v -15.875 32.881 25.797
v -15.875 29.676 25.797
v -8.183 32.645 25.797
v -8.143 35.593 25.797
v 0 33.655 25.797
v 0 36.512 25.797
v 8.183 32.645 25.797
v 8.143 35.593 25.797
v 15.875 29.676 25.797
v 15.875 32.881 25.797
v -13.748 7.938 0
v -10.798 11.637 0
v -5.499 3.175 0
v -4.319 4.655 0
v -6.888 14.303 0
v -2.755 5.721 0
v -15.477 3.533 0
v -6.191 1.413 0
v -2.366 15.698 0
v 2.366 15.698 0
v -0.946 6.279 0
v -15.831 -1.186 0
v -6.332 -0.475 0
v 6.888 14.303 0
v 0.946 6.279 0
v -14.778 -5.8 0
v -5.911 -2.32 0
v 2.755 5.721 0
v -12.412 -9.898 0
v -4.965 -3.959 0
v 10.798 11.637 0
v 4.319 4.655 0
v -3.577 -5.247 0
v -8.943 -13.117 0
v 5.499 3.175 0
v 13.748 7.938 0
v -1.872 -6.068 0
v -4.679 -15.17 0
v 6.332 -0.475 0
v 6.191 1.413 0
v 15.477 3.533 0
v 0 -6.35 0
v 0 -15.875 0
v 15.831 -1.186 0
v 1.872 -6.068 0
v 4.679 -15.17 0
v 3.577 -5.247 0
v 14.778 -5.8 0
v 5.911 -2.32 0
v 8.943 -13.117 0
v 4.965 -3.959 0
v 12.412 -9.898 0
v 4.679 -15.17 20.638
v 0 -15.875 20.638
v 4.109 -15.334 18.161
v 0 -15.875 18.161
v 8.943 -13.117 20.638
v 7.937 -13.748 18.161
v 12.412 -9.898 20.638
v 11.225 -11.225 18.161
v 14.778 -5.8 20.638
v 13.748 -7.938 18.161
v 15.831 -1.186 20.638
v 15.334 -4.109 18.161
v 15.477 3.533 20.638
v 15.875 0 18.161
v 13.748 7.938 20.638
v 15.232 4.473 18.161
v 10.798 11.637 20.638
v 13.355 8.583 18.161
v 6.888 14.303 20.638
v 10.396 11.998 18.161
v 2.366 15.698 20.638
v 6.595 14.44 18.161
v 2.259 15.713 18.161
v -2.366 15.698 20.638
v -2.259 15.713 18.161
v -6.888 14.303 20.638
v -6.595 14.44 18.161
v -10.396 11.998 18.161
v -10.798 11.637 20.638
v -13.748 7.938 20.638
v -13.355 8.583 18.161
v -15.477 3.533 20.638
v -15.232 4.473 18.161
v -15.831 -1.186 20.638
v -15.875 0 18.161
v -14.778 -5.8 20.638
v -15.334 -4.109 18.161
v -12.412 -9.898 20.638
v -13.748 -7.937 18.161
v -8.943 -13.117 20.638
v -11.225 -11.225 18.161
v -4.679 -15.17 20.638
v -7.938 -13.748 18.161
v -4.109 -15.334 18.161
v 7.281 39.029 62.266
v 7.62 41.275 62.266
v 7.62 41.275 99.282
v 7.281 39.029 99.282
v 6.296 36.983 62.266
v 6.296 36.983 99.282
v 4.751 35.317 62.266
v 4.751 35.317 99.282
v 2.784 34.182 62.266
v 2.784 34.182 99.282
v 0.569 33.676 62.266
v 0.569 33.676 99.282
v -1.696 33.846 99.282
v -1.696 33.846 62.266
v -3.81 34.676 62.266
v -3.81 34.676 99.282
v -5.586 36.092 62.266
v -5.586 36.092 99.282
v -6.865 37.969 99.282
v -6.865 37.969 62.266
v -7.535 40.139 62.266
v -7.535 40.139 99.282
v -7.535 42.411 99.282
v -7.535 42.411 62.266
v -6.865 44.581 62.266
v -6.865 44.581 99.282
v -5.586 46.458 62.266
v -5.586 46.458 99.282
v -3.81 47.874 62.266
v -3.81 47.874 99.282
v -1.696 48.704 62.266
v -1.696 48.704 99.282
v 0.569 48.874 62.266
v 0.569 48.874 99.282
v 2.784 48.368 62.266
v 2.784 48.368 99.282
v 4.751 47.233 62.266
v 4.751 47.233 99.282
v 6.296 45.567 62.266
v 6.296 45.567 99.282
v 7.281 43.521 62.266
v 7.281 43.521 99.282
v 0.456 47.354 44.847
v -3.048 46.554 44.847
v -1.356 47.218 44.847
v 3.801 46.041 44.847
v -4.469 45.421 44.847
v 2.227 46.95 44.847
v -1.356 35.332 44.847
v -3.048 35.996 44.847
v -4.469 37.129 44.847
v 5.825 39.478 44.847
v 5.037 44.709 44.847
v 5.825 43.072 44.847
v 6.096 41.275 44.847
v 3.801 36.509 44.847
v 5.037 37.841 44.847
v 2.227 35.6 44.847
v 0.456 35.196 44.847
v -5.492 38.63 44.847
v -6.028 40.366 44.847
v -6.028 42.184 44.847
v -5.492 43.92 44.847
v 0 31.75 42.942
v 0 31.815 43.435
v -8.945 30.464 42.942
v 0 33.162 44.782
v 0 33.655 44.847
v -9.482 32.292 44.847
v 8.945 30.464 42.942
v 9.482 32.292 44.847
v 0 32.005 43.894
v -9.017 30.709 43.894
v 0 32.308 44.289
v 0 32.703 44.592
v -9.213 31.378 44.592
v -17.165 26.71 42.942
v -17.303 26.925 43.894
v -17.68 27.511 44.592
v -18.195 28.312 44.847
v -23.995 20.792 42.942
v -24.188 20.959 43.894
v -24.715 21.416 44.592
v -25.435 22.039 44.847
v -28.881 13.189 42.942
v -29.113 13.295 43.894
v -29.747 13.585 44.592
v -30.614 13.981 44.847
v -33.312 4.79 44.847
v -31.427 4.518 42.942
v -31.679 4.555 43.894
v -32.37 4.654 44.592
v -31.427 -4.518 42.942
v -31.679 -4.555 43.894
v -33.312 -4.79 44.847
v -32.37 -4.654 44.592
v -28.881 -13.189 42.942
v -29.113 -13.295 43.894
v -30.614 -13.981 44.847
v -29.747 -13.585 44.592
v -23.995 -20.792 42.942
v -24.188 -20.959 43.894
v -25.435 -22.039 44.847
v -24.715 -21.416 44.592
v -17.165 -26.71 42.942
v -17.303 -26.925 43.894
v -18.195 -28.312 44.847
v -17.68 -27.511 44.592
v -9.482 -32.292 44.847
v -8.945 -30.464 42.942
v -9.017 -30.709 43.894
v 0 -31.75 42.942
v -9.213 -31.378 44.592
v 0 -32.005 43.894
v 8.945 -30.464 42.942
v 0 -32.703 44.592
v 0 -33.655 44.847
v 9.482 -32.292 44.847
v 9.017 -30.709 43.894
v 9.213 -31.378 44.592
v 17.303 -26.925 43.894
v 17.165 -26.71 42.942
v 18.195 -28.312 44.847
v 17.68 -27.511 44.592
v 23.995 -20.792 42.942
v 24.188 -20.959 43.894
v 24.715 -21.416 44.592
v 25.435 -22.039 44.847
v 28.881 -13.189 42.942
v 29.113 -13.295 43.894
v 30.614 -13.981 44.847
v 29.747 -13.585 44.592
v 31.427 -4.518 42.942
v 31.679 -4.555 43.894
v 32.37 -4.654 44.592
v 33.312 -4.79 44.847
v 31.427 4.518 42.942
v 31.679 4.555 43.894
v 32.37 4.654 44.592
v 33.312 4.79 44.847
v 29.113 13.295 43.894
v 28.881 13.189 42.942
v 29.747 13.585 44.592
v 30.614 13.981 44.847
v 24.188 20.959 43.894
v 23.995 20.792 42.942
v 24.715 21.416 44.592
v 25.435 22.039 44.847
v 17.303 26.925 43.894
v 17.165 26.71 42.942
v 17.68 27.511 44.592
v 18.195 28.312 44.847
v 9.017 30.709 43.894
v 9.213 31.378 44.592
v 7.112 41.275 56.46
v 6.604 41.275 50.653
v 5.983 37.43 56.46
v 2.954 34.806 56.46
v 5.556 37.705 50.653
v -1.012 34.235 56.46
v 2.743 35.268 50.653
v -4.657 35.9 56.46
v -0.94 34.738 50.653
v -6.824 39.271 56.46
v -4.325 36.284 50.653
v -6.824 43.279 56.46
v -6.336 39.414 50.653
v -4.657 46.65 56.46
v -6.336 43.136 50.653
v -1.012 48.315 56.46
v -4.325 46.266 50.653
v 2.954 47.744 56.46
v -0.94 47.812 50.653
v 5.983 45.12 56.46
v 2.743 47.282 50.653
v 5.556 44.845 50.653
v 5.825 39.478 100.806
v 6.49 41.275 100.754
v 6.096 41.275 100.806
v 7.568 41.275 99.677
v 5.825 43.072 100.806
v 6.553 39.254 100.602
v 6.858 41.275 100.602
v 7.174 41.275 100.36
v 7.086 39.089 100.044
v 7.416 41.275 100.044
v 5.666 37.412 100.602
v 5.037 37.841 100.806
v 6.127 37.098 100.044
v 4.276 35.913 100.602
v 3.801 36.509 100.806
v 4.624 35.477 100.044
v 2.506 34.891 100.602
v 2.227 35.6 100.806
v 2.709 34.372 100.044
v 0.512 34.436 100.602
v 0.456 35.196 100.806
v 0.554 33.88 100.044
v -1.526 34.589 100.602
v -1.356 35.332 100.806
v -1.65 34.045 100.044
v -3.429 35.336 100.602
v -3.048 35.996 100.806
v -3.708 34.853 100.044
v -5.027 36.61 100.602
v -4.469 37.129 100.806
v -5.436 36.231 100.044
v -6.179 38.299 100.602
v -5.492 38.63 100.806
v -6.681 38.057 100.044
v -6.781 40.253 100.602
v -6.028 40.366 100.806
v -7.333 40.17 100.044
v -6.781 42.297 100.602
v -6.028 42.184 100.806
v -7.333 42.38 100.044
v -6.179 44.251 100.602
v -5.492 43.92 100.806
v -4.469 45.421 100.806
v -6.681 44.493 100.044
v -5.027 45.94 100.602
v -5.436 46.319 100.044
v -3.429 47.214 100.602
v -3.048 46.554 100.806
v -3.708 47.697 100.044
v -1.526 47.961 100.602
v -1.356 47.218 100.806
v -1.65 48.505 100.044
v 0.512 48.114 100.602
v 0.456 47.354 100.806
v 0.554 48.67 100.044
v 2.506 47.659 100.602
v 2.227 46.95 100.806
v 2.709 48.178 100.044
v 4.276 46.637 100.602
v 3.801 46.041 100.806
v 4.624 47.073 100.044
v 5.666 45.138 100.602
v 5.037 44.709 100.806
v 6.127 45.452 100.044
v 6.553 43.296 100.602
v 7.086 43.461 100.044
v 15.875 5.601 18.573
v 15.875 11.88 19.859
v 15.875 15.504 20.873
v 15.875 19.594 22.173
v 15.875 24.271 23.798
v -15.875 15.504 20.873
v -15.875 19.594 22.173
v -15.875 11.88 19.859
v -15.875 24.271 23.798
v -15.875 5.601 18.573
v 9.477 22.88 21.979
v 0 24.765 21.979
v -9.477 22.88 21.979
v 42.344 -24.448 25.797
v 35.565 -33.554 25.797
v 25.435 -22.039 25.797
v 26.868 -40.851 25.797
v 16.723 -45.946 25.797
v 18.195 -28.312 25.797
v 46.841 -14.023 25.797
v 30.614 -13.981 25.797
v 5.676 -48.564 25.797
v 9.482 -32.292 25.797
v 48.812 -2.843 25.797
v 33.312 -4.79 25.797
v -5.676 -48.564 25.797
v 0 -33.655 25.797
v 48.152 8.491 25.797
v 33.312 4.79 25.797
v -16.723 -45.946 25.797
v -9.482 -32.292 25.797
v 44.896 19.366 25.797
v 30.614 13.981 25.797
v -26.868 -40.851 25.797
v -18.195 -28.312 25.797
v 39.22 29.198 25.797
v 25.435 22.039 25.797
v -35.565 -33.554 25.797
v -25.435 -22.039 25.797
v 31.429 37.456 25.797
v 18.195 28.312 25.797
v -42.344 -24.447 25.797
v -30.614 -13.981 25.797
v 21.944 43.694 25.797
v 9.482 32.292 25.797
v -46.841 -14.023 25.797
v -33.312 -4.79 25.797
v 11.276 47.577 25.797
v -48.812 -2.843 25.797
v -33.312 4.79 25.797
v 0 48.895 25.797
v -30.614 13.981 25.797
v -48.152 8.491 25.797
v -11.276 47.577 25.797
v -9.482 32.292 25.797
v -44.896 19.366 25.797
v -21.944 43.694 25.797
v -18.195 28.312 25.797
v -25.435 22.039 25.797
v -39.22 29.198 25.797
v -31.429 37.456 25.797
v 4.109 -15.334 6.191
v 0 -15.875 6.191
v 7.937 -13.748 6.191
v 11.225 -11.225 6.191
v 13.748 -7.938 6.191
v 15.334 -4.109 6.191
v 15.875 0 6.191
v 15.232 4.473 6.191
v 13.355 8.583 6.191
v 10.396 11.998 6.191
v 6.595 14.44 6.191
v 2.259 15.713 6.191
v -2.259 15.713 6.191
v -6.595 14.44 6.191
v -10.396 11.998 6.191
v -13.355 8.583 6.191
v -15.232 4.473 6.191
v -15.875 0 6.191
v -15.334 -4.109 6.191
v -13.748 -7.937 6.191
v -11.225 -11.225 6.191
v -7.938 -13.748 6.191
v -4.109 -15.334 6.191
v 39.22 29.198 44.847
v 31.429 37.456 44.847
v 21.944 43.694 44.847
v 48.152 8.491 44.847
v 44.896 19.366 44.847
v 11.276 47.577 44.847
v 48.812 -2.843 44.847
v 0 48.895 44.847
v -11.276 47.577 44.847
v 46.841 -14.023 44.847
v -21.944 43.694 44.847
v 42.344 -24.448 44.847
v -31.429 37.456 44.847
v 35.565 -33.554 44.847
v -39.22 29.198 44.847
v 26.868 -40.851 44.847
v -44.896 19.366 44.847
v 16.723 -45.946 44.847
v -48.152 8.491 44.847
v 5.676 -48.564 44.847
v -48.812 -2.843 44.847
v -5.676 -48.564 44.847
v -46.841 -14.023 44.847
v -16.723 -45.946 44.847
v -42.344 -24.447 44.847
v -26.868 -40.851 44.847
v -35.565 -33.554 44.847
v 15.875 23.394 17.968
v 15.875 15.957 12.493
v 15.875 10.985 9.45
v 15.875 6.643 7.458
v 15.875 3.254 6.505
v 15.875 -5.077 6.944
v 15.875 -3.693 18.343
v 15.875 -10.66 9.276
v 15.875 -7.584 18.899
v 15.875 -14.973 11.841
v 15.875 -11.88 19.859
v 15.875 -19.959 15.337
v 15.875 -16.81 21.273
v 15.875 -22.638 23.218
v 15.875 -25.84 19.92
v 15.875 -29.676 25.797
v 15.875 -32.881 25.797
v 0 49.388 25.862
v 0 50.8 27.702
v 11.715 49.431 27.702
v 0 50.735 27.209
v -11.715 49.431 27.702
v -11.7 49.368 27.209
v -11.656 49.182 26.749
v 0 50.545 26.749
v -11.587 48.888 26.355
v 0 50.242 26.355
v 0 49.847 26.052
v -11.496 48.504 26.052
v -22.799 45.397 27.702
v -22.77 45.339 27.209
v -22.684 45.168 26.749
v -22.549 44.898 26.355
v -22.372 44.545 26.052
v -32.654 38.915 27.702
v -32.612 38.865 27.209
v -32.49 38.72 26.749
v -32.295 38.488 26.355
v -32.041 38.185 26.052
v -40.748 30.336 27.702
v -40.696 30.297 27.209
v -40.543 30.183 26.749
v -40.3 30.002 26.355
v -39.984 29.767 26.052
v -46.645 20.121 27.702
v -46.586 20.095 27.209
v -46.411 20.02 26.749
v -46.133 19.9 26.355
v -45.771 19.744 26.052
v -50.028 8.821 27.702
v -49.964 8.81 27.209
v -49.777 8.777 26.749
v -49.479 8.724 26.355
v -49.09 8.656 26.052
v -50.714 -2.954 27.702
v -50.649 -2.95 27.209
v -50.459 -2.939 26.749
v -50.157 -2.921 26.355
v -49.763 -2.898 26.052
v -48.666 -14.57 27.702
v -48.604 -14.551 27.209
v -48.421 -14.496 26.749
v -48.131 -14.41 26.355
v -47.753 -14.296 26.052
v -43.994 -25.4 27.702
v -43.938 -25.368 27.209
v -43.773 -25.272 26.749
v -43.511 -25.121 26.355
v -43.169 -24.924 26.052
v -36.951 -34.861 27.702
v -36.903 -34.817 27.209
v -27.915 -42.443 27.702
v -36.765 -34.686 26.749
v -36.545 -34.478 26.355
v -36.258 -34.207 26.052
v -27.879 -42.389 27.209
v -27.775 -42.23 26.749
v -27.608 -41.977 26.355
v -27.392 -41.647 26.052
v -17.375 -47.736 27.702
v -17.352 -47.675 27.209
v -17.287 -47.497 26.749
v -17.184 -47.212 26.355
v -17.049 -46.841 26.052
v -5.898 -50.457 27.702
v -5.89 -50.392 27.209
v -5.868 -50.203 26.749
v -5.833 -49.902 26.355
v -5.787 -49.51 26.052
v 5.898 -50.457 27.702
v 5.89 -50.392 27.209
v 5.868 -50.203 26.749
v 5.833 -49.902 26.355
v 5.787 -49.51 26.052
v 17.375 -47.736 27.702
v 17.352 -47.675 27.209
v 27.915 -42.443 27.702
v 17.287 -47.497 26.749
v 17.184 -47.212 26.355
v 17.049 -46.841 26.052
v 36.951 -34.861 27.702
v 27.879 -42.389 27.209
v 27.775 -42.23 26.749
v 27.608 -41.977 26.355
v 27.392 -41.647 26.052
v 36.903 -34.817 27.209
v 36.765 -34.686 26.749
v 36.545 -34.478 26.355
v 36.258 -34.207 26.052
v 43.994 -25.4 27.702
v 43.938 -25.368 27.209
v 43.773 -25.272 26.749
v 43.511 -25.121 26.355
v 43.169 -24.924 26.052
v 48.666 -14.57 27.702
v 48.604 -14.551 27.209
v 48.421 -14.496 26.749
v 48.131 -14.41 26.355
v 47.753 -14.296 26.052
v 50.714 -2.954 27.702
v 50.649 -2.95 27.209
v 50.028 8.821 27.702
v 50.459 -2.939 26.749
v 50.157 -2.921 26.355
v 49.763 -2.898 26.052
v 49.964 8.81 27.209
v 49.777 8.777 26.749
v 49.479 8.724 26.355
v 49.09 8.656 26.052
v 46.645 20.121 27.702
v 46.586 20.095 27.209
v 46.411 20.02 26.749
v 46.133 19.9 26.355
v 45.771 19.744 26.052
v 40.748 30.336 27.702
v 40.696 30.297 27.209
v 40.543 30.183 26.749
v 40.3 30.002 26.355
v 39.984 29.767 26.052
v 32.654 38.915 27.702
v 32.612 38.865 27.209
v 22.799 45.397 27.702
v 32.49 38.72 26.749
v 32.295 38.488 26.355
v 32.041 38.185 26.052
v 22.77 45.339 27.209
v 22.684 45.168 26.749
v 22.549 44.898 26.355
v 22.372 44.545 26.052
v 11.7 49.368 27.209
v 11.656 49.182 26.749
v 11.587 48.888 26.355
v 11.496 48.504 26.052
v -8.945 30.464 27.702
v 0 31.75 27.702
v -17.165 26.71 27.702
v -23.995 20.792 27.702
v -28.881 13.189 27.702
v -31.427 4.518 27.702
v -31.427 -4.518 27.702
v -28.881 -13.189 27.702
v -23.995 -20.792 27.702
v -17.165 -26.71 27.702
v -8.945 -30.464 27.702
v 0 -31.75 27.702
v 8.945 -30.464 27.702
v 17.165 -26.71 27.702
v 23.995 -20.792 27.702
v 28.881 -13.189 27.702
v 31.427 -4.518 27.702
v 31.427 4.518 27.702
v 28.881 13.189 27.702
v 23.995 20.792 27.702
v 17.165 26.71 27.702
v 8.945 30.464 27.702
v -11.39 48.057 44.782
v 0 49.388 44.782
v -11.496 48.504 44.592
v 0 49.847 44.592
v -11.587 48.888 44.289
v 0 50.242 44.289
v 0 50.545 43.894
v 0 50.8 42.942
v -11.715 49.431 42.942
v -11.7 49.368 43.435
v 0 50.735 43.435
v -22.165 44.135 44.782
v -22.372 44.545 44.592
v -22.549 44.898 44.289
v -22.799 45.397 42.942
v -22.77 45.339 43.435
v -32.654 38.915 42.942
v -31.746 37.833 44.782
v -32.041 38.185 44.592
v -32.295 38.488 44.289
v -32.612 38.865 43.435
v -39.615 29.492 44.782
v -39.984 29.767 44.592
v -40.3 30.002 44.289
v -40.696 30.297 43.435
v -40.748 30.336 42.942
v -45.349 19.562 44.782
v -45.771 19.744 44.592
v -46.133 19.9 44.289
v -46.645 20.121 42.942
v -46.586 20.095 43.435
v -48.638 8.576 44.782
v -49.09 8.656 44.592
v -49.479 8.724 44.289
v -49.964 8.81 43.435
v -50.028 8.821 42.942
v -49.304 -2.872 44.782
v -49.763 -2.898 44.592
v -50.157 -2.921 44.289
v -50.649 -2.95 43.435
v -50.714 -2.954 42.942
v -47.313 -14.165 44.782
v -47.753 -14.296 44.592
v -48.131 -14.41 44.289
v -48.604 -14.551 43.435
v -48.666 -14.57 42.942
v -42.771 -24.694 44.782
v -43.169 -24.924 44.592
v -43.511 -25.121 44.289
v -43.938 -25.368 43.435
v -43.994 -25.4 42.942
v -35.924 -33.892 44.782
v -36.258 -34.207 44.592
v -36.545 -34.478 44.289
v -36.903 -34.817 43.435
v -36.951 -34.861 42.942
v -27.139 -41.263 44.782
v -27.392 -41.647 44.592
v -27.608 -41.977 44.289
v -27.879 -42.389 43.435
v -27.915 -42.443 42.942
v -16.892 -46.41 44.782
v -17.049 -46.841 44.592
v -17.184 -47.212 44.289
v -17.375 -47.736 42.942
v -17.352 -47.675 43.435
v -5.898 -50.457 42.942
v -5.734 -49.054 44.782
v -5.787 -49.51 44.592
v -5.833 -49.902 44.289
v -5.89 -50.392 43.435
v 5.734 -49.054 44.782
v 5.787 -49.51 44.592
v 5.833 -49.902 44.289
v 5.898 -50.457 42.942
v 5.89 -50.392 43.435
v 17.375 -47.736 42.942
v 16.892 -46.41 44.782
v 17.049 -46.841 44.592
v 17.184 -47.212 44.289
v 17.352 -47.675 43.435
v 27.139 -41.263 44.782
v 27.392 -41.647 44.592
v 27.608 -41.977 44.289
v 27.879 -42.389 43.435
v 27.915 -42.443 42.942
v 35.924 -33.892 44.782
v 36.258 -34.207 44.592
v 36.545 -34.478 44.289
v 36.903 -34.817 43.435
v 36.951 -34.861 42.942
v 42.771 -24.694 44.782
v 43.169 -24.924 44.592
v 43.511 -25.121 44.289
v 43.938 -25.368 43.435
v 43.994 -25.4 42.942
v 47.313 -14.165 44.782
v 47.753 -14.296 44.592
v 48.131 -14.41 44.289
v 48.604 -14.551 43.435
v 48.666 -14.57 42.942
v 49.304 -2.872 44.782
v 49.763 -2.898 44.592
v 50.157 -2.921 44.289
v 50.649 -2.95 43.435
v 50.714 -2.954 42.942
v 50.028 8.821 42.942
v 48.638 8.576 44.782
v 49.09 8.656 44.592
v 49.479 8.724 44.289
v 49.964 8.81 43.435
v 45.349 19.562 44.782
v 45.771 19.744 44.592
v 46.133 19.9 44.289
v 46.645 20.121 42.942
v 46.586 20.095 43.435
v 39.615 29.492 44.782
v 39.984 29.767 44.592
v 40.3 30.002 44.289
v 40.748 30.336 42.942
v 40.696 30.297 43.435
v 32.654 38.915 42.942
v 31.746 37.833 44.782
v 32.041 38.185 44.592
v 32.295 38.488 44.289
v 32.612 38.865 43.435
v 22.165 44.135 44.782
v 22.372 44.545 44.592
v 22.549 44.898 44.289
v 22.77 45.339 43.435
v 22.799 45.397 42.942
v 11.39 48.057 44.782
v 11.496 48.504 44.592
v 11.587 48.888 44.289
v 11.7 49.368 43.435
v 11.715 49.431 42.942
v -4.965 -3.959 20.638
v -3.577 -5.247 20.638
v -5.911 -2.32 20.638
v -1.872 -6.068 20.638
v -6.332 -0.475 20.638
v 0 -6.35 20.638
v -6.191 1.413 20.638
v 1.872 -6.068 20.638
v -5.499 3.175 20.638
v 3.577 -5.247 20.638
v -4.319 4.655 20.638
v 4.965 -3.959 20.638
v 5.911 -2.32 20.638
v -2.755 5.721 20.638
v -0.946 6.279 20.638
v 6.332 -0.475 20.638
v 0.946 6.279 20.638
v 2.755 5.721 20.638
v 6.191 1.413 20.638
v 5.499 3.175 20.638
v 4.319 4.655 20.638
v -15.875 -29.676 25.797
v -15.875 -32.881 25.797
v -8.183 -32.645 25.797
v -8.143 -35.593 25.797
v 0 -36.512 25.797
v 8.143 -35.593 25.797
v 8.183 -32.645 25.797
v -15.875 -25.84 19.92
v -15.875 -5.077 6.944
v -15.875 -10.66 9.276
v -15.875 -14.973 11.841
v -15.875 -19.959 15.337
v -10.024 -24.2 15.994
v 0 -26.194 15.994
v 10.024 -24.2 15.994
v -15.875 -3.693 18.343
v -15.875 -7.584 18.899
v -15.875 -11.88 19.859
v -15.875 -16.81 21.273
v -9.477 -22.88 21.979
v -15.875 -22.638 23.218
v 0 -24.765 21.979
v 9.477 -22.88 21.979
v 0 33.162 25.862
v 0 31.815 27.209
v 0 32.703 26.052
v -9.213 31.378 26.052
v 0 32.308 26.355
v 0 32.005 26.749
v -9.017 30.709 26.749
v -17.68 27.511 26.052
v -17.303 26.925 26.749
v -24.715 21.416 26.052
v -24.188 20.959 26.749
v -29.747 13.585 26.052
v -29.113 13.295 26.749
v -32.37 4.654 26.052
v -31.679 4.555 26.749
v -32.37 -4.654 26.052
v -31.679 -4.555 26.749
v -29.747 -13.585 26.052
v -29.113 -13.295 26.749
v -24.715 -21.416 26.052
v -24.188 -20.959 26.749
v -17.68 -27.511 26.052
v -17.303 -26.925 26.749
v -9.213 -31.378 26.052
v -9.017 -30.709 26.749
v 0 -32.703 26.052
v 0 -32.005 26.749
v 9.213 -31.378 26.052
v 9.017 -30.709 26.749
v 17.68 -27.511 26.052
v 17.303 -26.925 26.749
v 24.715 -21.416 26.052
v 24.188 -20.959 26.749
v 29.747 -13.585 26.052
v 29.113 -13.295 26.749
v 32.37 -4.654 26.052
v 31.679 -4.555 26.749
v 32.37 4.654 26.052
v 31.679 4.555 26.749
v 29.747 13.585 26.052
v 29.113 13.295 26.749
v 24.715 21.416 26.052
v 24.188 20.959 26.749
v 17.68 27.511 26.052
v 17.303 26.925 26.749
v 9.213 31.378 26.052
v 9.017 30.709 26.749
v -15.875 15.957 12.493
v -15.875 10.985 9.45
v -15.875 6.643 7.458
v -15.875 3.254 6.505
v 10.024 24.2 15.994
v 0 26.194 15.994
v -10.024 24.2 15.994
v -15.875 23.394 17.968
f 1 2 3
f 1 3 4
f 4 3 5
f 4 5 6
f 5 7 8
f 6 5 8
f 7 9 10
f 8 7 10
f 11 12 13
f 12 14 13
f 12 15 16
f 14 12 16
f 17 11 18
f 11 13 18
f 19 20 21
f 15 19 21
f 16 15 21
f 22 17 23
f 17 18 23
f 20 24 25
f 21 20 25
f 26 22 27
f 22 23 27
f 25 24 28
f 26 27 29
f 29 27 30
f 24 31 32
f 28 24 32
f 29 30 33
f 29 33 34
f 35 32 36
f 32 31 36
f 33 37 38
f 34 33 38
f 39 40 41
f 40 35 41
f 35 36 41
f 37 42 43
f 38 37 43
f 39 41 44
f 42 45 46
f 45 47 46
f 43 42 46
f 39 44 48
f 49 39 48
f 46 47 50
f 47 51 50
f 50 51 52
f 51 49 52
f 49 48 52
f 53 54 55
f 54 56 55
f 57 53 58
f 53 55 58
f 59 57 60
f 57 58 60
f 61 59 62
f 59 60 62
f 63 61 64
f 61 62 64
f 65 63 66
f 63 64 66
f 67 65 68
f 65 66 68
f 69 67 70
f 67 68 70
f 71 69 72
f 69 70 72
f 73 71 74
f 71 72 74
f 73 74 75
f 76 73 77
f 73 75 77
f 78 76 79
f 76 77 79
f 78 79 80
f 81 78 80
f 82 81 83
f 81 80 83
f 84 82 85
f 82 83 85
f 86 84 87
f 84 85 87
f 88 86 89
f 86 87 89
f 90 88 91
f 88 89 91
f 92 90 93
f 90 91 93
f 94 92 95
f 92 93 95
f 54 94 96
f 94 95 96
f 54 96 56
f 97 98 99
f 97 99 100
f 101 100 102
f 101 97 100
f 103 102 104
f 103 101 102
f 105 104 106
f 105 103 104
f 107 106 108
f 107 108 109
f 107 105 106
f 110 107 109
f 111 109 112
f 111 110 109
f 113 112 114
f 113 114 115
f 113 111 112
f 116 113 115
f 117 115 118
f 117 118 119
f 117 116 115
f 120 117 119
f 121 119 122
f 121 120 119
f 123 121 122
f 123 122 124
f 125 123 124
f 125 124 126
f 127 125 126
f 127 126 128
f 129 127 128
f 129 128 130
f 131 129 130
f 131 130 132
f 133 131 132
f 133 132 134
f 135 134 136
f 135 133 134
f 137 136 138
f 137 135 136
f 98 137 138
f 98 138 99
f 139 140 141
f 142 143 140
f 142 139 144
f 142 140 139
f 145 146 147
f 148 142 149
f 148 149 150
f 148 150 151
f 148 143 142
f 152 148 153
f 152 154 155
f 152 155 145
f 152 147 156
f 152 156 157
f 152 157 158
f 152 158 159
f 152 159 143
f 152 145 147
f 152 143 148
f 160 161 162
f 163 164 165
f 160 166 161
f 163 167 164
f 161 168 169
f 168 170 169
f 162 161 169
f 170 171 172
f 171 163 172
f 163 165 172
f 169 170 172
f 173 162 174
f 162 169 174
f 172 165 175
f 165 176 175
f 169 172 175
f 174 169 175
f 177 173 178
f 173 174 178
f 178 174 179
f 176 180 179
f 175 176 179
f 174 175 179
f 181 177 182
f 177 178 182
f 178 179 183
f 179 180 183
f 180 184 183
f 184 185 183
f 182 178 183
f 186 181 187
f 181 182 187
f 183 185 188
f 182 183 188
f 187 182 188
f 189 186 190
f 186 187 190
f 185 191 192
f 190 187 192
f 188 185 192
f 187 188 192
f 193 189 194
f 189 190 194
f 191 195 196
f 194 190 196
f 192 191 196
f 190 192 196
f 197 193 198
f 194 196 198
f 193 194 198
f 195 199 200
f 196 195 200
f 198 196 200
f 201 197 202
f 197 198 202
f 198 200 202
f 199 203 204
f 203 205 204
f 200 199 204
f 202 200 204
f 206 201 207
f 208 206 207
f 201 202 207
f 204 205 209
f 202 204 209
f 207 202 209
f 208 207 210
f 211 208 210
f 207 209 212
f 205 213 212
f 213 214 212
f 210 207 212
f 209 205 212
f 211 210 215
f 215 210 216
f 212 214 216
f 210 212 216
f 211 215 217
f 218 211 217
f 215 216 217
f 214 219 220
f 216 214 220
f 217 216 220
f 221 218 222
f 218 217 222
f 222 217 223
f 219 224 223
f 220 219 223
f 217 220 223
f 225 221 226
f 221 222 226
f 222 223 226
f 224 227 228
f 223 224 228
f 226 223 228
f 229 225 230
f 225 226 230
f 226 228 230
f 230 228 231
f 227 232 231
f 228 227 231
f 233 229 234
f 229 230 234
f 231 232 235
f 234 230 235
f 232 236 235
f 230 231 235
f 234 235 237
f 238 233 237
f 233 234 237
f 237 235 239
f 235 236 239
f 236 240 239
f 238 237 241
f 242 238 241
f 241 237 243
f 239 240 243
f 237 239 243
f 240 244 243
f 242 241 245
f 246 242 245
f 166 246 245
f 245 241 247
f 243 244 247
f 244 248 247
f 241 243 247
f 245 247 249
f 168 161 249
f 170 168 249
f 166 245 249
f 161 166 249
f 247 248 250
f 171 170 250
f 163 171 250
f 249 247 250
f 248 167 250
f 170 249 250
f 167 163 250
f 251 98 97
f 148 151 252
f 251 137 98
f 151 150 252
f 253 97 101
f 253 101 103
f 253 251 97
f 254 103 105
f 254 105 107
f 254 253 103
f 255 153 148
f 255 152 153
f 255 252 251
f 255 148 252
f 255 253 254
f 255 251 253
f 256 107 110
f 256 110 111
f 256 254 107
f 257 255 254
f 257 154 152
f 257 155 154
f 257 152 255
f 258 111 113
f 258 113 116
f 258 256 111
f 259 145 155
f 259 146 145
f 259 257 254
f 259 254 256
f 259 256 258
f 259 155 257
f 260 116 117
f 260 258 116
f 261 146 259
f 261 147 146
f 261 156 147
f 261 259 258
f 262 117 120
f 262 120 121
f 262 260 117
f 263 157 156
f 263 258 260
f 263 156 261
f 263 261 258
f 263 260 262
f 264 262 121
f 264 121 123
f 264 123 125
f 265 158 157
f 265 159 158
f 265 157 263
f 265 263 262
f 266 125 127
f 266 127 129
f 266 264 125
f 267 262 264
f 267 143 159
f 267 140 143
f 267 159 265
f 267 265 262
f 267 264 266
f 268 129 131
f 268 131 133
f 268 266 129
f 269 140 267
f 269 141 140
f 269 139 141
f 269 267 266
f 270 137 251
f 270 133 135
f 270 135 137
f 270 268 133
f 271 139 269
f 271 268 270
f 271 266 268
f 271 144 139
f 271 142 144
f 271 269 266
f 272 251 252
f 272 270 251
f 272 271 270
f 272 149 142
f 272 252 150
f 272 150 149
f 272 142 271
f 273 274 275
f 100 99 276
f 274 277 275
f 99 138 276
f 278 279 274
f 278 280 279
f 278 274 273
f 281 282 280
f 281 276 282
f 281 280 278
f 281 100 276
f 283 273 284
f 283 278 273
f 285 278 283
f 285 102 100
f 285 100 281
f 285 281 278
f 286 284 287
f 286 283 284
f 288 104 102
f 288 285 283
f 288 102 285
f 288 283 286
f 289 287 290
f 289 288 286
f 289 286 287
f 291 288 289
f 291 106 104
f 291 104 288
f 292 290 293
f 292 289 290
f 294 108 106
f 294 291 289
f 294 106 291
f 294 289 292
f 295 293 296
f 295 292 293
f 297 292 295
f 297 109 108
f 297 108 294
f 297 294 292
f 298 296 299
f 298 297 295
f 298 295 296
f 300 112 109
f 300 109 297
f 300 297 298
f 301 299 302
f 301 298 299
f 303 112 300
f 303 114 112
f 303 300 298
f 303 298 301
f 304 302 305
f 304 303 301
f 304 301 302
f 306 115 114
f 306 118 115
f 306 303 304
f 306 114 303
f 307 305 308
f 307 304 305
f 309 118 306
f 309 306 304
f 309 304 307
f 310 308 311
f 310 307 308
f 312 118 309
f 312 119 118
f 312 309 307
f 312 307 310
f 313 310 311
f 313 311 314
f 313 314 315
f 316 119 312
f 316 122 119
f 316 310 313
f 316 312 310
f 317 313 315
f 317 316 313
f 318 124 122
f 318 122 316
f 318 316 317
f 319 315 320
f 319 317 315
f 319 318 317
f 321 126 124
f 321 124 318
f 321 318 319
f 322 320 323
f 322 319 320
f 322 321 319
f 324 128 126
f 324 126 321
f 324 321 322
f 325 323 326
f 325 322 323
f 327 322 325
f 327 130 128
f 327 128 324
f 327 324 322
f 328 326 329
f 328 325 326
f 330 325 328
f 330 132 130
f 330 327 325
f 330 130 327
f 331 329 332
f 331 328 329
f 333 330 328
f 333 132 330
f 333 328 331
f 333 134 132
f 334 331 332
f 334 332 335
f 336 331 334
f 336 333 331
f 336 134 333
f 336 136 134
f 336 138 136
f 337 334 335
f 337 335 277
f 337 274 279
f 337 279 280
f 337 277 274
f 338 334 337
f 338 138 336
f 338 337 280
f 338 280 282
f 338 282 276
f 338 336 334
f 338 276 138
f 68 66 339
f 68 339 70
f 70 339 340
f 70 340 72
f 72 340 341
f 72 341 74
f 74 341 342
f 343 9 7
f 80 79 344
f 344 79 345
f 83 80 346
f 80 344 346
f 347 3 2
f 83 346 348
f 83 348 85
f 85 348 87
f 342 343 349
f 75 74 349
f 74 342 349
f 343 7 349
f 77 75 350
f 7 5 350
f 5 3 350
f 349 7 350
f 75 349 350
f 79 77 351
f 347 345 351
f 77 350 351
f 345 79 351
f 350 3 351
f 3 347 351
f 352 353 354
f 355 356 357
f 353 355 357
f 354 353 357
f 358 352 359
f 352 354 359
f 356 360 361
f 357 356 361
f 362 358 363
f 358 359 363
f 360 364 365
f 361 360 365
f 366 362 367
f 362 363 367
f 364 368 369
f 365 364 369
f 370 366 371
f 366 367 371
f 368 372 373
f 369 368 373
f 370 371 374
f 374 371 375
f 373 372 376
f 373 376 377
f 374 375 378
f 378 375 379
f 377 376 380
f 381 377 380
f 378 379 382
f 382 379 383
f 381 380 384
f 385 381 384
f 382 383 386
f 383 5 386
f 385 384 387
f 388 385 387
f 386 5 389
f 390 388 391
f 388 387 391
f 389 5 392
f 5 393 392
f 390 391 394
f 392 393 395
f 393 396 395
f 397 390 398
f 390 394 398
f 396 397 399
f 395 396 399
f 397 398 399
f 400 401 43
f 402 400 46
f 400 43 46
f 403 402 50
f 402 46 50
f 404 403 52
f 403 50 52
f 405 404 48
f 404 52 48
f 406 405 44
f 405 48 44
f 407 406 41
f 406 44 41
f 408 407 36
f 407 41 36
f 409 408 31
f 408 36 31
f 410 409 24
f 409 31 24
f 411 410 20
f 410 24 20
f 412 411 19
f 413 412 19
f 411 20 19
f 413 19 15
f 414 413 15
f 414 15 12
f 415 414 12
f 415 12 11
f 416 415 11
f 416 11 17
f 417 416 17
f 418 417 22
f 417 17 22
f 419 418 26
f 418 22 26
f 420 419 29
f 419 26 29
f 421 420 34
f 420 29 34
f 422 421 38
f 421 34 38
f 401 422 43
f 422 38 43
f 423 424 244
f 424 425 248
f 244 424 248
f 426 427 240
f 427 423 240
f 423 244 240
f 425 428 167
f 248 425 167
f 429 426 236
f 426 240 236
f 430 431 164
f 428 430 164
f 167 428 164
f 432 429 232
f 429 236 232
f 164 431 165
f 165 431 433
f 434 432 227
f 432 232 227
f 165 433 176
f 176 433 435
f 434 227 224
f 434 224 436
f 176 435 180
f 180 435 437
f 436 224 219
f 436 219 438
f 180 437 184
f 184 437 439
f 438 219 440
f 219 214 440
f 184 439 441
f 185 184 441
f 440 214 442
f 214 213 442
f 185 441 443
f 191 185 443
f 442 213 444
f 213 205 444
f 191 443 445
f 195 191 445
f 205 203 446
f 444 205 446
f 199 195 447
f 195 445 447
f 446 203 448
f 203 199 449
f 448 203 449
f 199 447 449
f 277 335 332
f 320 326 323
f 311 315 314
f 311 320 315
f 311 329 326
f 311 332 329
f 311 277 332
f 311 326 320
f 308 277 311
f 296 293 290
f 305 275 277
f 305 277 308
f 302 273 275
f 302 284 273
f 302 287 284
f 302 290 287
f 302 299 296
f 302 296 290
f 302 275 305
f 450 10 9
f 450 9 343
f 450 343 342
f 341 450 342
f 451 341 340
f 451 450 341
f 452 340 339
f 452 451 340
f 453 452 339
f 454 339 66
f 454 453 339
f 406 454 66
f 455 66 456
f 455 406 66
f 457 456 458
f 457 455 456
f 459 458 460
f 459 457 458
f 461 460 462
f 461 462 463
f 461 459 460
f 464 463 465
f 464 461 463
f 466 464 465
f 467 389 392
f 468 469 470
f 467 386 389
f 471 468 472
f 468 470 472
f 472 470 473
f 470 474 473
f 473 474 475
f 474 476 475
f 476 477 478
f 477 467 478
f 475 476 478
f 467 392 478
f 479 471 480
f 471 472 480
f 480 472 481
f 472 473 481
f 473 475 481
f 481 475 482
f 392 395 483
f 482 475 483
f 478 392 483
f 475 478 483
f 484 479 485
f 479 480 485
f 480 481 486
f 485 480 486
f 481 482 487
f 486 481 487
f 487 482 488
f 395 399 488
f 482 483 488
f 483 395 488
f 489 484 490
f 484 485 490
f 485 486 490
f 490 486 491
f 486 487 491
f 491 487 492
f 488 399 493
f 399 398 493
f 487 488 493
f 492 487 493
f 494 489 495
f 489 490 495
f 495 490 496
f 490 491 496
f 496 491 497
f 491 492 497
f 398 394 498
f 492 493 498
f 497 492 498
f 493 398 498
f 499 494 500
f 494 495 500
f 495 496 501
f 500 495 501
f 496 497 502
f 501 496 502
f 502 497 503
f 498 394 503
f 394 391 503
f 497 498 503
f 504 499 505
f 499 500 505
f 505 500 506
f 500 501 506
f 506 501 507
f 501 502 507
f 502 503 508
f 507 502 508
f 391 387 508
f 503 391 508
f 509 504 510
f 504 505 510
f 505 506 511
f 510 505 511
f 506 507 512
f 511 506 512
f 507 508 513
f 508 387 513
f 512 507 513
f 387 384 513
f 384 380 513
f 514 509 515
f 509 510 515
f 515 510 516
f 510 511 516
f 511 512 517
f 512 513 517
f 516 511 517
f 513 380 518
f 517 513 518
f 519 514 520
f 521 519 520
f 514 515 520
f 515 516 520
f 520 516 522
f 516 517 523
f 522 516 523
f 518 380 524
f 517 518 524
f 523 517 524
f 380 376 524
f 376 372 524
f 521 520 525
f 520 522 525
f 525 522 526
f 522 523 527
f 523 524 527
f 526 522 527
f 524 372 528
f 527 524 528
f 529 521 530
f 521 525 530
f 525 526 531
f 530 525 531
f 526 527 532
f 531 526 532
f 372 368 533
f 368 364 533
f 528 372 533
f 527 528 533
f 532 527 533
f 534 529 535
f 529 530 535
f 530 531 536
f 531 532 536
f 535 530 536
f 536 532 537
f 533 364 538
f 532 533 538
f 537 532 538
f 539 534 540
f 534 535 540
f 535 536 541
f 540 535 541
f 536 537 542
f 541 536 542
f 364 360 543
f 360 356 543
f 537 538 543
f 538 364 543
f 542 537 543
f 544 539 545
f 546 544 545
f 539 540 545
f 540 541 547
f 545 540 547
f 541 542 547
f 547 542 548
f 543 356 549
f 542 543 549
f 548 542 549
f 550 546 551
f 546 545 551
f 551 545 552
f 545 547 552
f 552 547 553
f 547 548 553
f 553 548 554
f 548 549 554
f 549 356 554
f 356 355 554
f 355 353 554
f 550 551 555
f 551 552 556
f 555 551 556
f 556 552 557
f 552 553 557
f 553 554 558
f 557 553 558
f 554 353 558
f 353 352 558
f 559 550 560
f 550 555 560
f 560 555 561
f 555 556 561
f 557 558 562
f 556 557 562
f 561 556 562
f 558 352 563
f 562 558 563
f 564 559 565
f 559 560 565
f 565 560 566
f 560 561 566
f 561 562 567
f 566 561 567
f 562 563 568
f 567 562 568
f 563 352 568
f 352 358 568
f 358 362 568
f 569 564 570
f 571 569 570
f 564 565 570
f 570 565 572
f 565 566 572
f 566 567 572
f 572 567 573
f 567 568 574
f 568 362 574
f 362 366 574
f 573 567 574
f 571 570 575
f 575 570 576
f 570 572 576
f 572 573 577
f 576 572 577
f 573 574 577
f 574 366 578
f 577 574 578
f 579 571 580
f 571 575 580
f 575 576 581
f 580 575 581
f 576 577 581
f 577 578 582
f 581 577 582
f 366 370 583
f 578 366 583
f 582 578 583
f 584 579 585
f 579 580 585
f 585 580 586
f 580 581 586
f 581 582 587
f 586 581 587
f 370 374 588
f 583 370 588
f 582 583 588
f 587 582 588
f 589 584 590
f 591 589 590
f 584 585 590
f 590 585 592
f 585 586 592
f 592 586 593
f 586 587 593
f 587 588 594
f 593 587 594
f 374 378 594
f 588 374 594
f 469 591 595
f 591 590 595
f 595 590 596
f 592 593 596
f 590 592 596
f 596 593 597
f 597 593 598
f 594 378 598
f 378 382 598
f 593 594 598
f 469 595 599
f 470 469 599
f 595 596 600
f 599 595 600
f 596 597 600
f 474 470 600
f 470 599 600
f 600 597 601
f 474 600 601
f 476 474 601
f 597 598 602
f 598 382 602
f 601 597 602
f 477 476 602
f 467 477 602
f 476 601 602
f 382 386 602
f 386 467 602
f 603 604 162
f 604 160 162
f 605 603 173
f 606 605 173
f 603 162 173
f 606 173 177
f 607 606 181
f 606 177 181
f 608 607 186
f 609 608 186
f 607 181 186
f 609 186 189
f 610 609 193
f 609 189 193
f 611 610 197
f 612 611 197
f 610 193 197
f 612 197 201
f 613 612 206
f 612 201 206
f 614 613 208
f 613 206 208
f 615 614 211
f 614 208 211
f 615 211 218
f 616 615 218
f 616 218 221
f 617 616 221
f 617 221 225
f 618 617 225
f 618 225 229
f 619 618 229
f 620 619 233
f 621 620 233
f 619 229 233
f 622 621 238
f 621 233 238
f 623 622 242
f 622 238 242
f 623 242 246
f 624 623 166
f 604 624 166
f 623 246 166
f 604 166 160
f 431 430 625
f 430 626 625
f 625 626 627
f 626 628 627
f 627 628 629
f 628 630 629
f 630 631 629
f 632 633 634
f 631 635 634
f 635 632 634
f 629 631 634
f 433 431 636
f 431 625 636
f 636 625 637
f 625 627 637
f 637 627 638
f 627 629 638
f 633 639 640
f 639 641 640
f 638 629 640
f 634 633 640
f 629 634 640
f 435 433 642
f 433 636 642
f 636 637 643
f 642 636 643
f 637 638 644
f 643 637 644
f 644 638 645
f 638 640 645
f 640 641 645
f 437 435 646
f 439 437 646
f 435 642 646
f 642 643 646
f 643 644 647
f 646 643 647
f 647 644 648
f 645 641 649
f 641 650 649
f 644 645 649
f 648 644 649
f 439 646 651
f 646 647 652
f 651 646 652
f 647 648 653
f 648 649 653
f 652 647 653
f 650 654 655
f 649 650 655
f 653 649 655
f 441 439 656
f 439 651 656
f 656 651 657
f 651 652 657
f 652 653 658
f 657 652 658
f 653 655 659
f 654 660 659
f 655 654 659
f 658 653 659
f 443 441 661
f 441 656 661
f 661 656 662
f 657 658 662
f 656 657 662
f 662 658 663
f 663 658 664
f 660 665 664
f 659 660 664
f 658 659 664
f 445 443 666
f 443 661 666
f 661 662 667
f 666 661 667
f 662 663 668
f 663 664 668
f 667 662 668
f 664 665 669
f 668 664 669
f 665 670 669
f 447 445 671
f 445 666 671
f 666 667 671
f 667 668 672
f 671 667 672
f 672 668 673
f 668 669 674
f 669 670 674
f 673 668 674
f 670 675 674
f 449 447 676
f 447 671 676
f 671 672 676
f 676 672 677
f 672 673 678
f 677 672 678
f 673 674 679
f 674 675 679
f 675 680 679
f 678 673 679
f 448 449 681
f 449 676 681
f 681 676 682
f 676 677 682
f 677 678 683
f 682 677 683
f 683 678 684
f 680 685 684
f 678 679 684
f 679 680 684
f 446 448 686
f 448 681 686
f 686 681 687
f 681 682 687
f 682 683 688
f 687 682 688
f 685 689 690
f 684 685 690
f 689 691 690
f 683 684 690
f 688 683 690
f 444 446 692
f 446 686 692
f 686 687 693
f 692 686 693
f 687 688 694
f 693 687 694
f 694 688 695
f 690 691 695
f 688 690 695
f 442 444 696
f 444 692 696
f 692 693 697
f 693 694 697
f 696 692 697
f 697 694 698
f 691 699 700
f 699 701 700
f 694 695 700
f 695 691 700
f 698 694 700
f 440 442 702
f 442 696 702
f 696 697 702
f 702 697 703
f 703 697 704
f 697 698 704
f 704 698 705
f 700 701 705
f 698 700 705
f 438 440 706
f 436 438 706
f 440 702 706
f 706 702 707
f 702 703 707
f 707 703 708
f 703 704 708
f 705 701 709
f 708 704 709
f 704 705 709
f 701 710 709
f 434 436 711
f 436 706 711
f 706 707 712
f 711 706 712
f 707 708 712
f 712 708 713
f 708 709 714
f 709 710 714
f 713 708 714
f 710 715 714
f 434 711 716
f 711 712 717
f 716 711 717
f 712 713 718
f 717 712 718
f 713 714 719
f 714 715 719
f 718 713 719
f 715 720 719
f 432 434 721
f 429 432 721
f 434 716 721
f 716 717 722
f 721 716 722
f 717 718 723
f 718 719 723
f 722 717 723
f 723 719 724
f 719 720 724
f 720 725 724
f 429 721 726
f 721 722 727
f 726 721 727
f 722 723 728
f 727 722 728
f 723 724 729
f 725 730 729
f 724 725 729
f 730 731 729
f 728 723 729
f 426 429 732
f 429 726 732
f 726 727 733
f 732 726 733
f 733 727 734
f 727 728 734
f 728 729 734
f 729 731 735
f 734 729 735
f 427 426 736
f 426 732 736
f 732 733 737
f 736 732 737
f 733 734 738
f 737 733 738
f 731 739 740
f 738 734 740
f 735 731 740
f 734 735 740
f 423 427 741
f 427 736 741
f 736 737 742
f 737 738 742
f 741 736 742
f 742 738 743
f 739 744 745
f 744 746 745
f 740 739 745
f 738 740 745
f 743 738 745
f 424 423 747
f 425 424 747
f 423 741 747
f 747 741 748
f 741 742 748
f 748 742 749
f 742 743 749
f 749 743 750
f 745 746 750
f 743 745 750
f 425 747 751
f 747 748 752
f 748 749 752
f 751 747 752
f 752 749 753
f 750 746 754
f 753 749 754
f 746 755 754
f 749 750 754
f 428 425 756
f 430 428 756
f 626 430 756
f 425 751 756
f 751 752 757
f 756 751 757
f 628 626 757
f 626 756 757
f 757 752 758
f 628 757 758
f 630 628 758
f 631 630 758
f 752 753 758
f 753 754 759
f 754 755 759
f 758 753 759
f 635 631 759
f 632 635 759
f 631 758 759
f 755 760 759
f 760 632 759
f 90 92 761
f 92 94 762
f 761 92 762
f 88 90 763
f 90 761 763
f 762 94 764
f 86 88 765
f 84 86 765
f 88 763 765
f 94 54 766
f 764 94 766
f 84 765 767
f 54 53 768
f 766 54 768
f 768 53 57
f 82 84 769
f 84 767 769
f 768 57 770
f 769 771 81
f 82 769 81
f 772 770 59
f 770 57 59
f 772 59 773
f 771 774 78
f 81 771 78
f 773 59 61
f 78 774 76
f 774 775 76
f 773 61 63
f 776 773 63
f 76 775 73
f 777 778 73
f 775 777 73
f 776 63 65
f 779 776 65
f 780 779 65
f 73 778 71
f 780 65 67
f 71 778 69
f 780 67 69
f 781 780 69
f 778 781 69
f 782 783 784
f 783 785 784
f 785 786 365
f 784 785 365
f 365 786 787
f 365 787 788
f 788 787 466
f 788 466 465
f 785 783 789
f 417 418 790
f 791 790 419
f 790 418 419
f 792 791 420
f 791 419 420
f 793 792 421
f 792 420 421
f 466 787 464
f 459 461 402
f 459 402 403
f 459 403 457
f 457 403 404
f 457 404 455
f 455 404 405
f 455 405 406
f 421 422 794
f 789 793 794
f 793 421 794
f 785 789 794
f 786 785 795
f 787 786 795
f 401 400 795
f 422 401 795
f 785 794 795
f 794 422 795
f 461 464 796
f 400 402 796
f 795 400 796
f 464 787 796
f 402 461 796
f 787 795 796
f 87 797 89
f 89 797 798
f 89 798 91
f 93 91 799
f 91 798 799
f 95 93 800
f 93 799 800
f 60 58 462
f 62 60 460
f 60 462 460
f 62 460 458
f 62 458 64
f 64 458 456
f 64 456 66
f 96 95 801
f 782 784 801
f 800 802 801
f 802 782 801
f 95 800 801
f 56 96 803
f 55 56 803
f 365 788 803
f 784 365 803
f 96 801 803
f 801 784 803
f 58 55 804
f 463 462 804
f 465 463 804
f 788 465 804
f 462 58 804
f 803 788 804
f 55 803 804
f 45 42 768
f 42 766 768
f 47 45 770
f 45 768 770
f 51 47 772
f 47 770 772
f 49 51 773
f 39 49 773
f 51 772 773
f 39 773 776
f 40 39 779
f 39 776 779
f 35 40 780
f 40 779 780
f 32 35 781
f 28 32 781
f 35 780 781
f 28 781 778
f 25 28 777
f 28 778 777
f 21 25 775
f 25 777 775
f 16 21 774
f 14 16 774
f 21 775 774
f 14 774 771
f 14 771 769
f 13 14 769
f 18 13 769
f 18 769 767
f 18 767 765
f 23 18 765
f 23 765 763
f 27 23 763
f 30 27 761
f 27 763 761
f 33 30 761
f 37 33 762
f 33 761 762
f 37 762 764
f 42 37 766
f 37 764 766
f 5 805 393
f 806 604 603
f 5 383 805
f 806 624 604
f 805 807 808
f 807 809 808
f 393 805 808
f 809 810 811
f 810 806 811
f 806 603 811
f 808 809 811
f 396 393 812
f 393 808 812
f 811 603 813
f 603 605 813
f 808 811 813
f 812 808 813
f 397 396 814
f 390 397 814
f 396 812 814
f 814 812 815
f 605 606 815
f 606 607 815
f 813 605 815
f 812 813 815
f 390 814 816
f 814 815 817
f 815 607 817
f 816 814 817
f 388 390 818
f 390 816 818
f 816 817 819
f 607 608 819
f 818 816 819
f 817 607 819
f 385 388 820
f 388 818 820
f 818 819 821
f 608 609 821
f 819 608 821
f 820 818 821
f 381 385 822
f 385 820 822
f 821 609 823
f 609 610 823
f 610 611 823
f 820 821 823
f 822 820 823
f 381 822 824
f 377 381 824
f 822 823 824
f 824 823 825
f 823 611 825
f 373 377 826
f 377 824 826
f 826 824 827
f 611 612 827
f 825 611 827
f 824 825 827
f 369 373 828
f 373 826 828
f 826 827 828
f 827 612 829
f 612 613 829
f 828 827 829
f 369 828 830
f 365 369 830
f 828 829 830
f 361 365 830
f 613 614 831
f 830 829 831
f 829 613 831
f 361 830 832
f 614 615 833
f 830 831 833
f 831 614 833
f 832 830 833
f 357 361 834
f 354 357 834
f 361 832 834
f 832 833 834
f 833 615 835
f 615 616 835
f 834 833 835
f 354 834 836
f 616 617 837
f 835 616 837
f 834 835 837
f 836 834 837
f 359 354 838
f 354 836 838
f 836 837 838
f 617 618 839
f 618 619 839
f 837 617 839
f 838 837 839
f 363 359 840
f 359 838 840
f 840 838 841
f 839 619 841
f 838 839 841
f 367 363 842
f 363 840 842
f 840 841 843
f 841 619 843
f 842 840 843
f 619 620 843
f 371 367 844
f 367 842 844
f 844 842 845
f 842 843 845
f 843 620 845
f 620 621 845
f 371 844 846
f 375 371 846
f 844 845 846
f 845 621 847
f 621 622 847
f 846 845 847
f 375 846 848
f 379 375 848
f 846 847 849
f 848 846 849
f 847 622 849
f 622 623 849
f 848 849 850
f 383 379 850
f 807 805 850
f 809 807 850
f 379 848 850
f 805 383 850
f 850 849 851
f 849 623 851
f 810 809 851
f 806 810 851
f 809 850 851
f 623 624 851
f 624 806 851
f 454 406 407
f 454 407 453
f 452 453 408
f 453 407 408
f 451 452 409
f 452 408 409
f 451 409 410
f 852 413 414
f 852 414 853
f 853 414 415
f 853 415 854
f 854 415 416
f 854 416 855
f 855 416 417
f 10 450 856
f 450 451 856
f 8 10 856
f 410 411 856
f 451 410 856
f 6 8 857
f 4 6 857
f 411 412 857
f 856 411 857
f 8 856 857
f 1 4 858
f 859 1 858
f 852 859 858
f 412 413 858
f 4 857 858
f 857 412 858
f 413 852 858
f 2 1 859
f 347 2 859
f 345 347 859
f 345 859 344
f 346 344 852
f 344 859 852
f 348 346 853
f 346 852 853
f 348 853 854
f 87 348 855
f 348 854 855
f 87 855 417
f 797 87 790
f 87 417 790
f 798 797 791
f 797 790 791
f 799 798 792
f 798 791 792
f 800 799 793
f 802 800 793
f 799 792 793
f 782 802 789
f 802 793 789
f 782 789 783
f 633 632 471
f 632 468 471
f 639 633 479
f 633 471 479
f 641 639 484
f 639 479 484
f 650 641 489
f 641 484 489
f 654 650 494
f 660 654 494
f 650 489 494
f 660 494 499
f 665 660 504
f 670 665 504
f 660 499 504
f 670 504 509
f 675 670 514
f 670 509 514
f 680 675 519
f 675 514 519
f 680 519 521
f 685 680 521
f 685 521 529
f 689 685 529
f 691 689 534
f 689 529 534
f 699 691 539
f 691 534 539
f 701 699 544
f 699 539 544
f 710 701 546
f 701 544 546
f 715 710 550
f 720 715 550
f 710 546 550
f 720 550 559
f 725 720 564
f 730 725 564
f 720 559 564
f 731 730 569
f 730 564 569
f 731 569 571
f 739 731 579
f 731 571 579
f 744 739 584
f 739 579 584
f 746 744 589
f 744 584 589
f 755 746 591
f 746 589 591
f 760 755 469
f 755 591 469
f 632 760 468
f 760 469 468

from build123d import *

# Parameters (mm, degrees)
CUT_EXTRUDE1_DEPTH = 85.69074446
FILLET1_R          = 1.524


with BuildPart() as part:
    # Sketch1 → Revolve1 (revolve)
    with BuildSketch(Plane(origin=(0, 0, 0), x_dir=(0, 0, -1), z_dir=(1, 0, 0))):
        with BuildLine():
            Line((-25.796875, -48.895), (-25.796875, -36.5125))
            Line((-25.796875, -36.5125), (-25.796875, -33.655))
            ThreePointArc((-25.796875, -33.655), (-26.354836582, -32.307961582), (-27.701875, -31.75))
            Line((-27.701875, -31.75), (-42.941875, -31.75))
            ThreePointArc((-42.941875, -31.75), (-44.288913418, -32.307961582), (-44.846875, -33.655))
            Line((-44.846875, -33.655), (-44.846875, -48.895))
            ThreePointArc((-44.846875, -48.895), (-44.288913418, -50.242038418), (-42.941875, -50.8))
            Line((-42.941875, -50.8), (-27.701875, -50.8))
            ThreePointArc((-27.701875, -50.8), (-26.354836582, -50.242038418), (-25.796875, -48.895))
        make_face()
    revolve(axis=Axis((0, 0, 0), (0, 0, 1)))


with BuildPart() as body_2:
    # Sketch1<3> → Revolve2 (revolve)
    with BuildSketch(Plane(origin=(0, 0, 0), x_dir=(0, 0, -1), z_dir=(1, 0, 0))):
        Polygon((0, -15.875), (0, -6.35), (-20.6375, -6.35), (-20.6375, -15.875), (-18.161, -15.875), (-25.796875, -33.655), (-25.796875, -36.5125), (-6.19125, -15.875), align=None)
    revolve(axis=Axis((0, 0, 0), (0, 0, 1)))

    # Sketch2 → Cut-Extrude1 (cut, through all)
    with BuildSketch(Plane.XY):
        with BuildLine():
            Line((-15.875, 48.255822188), (-15.875, -48.255822188))
            ThreePointArc((-15.875, -48.255822188), (-50.8, 0), (-15.875, 48.255822188))
        make_face()
        with BuildLine():
            Line((15.875, 48.255822188), (15.875, -48.255822188))
            ThreePointArc((15.875, -48.255822188), (50.8, 0), (15.875, 48.255822188))
        make_face()
    extrude(amount=CUT_EXTRUDE1_DEPTH, mode=Mode.SUBTRACT)


with BuildPart() as body_3:
    # Sketch4 → Revolve3 (revolve)
    with BuildSketch(Plane(origin=(0, 0, 0), x_dir=(0, 0, -1), z_dir=(1, 0, 0))):
        Polygon((-44.846875, 47.371), (-44.846875, 41.275), (-100.80625, 41.275), (-100.80625, 48.895), (-62.266274709, 48.895), align=None)
    revolve(axis=Axis((0, 41.275, 44.846875), (0, 0, -1)))

    # Fillet1
    fillet1_edges = [body_3.edges().sort_by_distance(p)[0] for p in [
        (0, 33.655, 100.80625),
    ]]
    fillet(fillet1_edges, radius=FILLET1_R)


solid = Compound([part.part, body_2.part, body_3.part])
